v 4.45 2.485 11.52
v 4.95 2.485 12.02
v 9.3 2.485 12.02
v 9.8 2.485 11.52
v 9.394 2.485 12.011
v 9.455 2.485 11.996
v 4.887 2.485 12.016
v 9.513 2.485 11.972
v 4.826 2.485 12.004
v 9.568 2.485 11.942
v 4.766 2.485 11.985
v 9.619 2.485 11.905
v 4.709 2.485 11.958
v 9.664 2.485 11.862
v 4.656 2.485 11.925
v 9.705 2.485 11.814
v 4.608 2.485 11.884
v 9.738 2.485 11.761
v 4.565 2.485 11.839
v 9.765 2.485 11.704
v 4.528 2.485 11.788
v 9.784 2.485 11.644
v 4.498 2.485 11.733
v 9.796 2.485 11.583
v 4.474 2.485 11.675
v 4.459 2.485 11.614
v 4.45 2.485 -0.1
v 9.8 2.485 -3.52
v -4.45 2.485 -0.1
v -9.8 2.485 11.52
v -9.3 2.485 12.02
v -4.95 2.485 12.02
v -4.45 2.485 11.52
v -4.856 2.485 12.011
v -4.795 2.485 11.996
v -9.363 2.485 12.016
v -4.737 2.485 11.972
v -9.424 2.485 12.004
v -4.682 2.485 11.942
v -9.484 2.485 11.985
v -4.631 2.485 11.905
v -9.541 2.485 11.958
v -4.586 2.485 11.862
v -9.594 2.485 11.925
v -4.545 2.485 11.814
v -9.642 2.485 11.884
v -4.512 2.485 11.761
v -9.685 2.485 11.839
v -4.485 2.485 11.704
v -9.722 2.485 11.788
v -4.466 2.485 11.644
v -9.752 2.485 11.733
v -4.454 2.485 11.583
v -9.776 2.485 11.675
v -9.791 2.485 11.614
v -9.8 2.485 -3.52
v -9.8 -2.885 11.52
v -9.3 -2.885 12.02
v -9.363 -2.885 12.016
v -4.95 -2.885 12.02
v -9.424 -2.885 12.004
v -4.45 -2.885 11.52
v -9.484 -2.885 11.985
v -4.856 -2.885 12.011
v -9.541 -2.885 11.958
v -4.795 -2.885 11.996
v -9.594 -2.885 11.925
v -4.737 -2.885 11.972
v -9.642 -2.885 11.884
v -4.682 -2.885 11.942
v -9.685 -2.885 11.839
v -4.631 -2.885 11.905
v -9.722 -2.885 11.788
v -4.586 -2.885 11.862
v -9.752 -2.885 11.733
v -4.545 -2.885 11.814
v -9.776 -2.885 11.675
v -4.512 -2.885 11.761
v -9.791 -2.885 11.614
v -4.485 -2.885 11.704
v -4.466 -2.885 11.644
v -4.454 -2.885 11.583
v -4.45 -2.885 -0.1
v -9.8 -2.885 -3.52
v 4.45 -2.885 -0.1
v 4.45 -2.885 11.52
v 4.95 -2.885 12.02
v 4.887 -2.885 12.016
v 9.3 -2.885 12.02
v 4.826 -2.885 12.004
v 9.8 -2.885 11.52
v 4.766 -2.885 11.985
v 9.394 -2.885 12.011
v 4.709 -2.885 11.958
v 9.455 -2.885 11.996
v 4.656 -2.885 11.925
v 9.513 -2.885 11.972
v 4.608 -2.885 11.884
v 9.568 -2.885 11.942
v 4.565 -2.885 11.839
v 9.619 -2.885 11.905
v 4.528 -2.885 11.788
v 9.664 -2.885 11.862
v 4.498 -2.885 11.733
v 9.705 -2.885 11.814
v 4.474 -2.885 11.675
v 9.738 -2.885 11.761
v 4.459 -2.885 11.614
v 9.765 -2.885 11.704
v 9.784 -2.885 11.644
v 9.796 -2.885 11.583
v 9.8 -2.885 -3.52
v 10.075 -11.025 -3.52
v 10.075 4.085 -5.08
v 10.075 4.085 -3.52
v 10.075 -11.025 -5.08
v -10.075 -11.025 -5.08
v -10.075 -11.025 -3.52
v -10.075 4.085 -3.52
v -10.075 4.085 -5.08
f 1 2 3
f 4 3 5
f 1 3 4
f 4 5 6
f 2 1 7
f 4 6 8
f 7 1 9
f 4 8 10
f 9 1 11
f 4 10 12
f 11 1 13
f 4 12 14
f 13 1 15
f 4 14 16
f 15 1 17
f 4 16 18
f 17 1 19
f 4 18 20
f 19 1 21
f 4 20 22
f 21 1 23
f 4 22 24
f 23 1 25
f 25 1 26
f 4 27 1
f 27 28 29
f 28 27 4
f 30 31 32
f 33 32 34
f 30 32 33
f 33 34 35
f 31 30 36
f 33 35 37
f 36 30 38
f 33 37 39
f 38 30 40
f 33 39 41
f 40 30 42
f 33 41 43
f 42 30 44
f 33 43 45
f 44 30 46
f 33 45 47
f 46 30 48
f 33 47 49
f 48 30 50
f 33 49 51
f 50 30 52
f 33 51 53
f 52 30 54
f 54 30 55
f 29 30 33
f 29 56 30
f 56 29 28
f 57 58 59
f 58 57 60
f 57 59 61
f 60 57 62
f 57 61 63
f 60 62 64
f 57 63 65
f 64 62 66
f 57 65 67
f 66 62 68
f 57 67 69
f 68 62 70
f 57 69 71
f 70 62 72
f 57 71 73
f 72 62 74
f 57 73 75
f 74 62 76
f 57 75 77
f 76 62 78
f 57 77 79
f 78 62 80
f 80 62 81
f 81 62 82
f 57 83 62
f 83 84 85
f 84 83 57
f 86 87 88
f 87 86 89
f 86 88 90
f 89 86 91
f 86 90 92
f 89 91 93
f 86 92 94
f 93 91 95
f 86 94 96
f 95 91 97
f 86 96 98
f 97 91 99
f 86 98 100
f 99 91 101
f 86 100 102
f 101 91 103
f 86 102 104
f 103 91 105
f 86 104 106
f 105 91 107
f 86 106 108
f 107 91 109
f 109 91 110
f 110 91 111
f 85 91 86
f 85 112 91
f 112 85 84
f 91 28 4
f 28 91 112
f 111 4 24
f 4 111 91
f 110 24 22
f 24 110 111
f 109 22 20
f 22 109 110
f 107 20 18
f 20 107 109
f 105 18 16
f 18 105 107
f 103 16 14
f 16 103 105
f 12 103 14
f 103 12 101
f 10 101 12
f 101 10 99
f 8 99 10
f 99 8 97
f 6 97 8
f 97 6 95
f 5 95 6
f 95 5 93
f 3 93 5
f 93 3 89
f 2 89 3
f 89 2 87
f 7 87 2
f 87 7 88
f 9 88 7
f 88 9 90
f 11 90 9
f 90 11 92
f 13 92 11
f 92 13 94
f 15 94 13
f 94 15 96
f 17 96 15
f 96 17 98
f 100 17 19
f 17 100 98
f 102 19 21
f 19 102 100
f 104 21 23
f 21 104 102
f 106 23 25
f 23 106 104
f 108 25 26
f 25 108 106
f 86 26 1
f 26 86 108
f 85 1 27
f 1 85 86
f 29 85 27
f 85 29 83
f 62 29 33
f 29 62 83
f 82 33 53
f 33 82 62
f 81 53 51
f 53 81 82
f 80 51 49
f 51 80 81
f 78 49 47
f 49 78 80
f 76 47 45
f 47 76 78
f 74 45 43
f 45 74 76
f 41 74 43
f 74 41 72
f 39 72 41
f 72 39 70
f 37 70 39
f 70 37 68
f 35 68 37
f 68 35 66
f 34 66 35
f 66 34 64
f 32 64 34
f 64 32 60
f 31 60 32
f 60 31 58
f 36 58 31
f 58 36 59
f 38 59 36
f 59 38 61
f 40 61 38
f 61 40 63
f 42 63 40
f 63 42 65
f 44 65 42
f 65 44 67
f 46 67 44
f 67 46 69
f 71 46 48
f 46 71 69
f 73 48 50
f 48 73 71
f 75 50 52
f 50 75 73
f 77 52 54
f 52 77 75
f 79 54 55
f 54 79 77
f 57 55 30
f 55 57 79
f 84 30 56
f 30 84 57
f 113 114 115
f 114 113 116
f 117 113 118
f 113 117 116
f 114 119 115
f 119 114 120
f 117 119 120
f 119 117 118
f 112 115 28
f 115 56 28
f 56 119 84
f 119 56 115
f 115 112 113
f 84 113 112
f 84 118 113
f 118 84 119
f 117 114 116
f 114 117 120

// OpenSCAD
// file: formulas.scad
  
//Distance between 2 points
function distance(p1, p2) = sqrt(pow(p2[0]-p1[0], 2) + pow(p2[1]-p1[1], 2));
  
// distance between 2 arc end points
function arc_distance(r, depth) = sqrt(8*r*depth - 4*pow(depth, 2));
// file: dimensions.scad
use <formulas.scad>;

$fn=50;
export_fn=100;
export_scale=0.03937; // scales down mm->inches (useful if your laser cutter uses inches)
cut_diam=0.2;

// Global
PI = 3.15159265; 


span_bottle=100; 
bottle_rod_diam=10; 
front_rod_diam=10; 
width=470;
span_bottom=160; // Bottom rods span
span_bottle=120; // Bottle rods span
board_thickness=5.65;
nut_t=6;
back_tilt_angle=20;

cable_diam=1.7;

bushings_diam=15;
bushings_length=24;
bushings_hole_length=24;

strap_hole_dim=[4, 2];
strap_margin=3;

// Bottle grip
grip_margin=11;
bottle_axle_diam=8;
bottle_axle_pos=[span_bottom-sin(back_tilt_angle)*span_bottle/2, cos(back_tilt_angle)*span_bottle/2];

bottle_grip_bottom_diam=90;
bottle_grip_bottom_height=6;
bottle_grip_bottom_cone_height=4;

bottle_grip_top_diam=50;
bottle_grip_top_height=7;
bottle_grip_top_cone_height=20;
bottle_grip_top_diam=50;
bottle_grip_top_inner_diam=45;
bottle_pulley_teeth=62;


// Sides
holes_margin=25; 
axle_position=[0,0];
break_position=[70, 50];
axis_z=40;
bearing_extrusion_height=7.2;
bearing_extrusion_length=24;
bearing_axle_length=20;
bearing_id=8;

//x_top_rod_position=[0,bottle_axle_pos[1] + x_rods_span/2];
bottom_extrusion_height=5;
bottle_top_rod_position=[span_bottom-sin(back_tilt_angle)*span_bottle, cos(back_tilt_angle)*span_bottle];

// Right wall
bottle_axis_diam=15;
stepper_slide_distance=0;
a_stepper_pos=[span_bottom*0.4, 10];
stepper_rotation=0; //atan((bottle_axle_pos[1]-a_stepper_pos[1])/(bottle_axle_pos[0]-a_stepper_pos[0]));


// Left wall

// X table
x_carriage_pos=width/5;
x_a_distance=85;
x_table_tilt=0;
x_rods_span=50;
rod_ext=8;
table_rod_ext=0;
table_rods_diam=8;

// X stepper mount
x_stepper_mount_length = 50;
x_stepper_mount_width = x_rods_span + 10;
x_stepper_mount_shift=(22-9)/2;

x_table_width=width - board_thickness*2;

// X carriage
//carriage_length= 24; // single bushing
carriage_length=65; // double bushings
carriage_height=x_rods_span+20;
carriage_rounding_radius = 5;
carriage_bushing_hole_width = 10;
z_rods_length=120;
z_rods_diam=8;
z_bar_width=20;
z_pos=40;
z_bushings_diam=15;
z_bolt_diam=3;
z_rods_span=41;
z_bushings_pos = x_rods_span/2;
solenoid_dim = [27, 22, 25];
solenoid_pos=0;
plate_distance = sqrt(pow(bushings_diam/2, 2) - pow(carriage_bushing_hole_width/2, 2)) + board_thickness/2; // Calculates plate distance (depending on carriage_bushing_hole_width
echo("Plate distance:", plate_distance*2 + board_thickness);
z_plate_dist = 5;
z_bushings_hole_width = 2*sqrt(pow(bushings_diam/2, 2) - pow(z_plate_dist, 2));
nut_guide_hole_width=10;
nut_guide_hole_length=30;
nut_guide_height=z_plate_dist*2;
nut_guide_width=20;
z_leadscrew_diam=5;
carriage_screw_diam=8;

// Calculations for x table position
xz_span = plate_distance + z_plate_dist + board_thickness/2;
x_top_rod_position=[bottle_axle_pos[0] - cos(x_table_tilt)*(x_a_distance) + sin(x_table_tilt)*(-xz_span), bottle_axle_pos[1] + sin(x_table_tilt)*(x_a_distance) + cos(x_table_tilt)*(-xz_span)];
x_btm_rod_position=[bottle_axle_pos[0] - cos(x_table_tilt)*(x_a_distance + x_rods_span) + sin(x_table_tilt)*(-xz_span), bottle_axle_pos[1] + sin(x_table_tilt)*(x_a_distance + x_rods_span) + cos(x_table_tilt)*(-xz_span)];

toolbit_mount_diam=4.8;

// Bottle
bottle_pos=40;
bottle_diam=100;
bottle_height=360;

// Bottle bar
bottle_bar_width=40;
bottle_bar_height=span_bottle;
bottle_bar_pos=bottle_height+bottle_pos+30;

bearing_hole_diam=13;
bearing_guide_diam=22;


// Pulley properties
shaftDiameter = 8; // the shaft at the center, will be subtracted from the pulley. Better be too small than too wide.
hubDiameter = 30; // if the hub or timing pulley is big enough to fit a nut, this will be embedded.
hubHeight = 8; // the hub is the thick cylinder connected to the pulley to allow a set screw to go through or as a collar for a nut.
flanges = 2; // the rims that keep the belt from going anywhere
hubSetScewDiameter = 0; // use either a set screw or nut on a shaft. Set to 0 to not use a set screw.
numSetScrews = 3;
bottle_pulley_teeth = ceil(7.1*16); // this value together with the pitch determines the pulley diameter
echo("Teeth:", bottle_pulley_teeth);

toothType = 1; // 1 = slightly rounded, 2 = oval sharp, 3 = square. For square, set the toothWith a little low.

// Belt properties:
pitch = 2; // distance between the teeth
beltWidth = 6; // the width/height of the belt. The (vertical) size of the pulley is adapted to this.
beltThickness = 0.63; // thickness of the part excluding the notch depth!
notchDepth = 0.75; // make it slightly bigger than actual, there's an outward curvature in the inner solid part of the pulley
toothWidth = 1.2; // Teeth of the PULLEY, that is.
pulleyRadius = pitch*bottle_pulley_teeth/(PI*2) - notchDepth;

a_stepper_teeth=11;
a_stepper_pulley_radius=4.2;
x_stepper_pulley_radius=4.2;


// Belt tensioner
echo(belt_tensioner_position[1], "Tensioner position");
echo(a_stepper_pulley_radius, "11t radius");
belt_tensioner_bolt_diam=7.8;
belt_tensioner_elevation=8;
belt_tensioner_stroke=10;
belt_tensioner_axle_margin=3;
belt_tensioner_xpos = 105;
belt_tensioner_position=[belt_tensioner_xpos, a_stepper_pos[1] - a_stepper_pulley_radius + (bottle_axle_pos[1] - pulleyRadius - a_stepper_pos[1] + a_stepper_pulley_radius)/(bottle_axle_pos[0] - a_stepper_pos[0])*(belt_tensioner_xpos-a_stepper_pos[0]) + belt_tensioner_stroke/2 - 22/2];

x_belt_clamp_len=21;

electronics_mount_length=70;
electronics_mount_pos=80;
arduino_hole_diam=1;
// main file
include <dimensions.scad>;

module strap_holes(pos=[0,0], rot=0, span=8) {
  translate(pos) rotate([0,0,rot]) {
    translate([0,-span/2]) square(strap_hole_dim, center=true);
    translate([0,span/2]) square(strap_hole_dim, center=true);
  }
}

module nema17_holes(slide) {
  shaft_d = 22;
  screw_d=3;
  s=31;

  module screwhole() {
    hull() {
     translate([-slide/2,0,0]) circle(r=screw_d/2, center=true);
     translate([slide/2,0,0]) circle(h=depth, r=screw_d/2, center=true);
    }
  }

  translate([s/2,s/2,0]) screwhole();
  translate([-s/2,s/2,0]) screwhole();
  translate([s/2,-s/2,0]) screwhole();
  translate([-s/2,-s/2,0]) screwhole();

  circle(r=shaft_d/2, center=true);
}

module endstop(pcb_base=true) {
  // End stop from Sparkfun
  offset=0.2;

  outer=18.6;
  inner=9.9;
  height=15.04;
  inner_height=12.12;
  depth=4.97;
  pcb_width=20.15;
  pcb_length=15.11;
  pcb_thickness=1.56;
  margin=1.6;

  rotate([90, 0, 0]) 
  translate([-outer/2, -(height-inner_height) -offset*3, -depth/2]) {
    color("gray")
    linear_extrude(depth + offset*2)
    offset(0.5)
    difference() {
      square([outer, height]);
      translate([(outer - inner)/2, height - inner_height]) square([inner, inner_height]);
    }
    color("red")
    translate([-(pcb_width-outer)/2, -pcb_thickness, -margin]) cube([pcb_width, pcb_thickness, pcb_length]);
  }


}

endstop();
